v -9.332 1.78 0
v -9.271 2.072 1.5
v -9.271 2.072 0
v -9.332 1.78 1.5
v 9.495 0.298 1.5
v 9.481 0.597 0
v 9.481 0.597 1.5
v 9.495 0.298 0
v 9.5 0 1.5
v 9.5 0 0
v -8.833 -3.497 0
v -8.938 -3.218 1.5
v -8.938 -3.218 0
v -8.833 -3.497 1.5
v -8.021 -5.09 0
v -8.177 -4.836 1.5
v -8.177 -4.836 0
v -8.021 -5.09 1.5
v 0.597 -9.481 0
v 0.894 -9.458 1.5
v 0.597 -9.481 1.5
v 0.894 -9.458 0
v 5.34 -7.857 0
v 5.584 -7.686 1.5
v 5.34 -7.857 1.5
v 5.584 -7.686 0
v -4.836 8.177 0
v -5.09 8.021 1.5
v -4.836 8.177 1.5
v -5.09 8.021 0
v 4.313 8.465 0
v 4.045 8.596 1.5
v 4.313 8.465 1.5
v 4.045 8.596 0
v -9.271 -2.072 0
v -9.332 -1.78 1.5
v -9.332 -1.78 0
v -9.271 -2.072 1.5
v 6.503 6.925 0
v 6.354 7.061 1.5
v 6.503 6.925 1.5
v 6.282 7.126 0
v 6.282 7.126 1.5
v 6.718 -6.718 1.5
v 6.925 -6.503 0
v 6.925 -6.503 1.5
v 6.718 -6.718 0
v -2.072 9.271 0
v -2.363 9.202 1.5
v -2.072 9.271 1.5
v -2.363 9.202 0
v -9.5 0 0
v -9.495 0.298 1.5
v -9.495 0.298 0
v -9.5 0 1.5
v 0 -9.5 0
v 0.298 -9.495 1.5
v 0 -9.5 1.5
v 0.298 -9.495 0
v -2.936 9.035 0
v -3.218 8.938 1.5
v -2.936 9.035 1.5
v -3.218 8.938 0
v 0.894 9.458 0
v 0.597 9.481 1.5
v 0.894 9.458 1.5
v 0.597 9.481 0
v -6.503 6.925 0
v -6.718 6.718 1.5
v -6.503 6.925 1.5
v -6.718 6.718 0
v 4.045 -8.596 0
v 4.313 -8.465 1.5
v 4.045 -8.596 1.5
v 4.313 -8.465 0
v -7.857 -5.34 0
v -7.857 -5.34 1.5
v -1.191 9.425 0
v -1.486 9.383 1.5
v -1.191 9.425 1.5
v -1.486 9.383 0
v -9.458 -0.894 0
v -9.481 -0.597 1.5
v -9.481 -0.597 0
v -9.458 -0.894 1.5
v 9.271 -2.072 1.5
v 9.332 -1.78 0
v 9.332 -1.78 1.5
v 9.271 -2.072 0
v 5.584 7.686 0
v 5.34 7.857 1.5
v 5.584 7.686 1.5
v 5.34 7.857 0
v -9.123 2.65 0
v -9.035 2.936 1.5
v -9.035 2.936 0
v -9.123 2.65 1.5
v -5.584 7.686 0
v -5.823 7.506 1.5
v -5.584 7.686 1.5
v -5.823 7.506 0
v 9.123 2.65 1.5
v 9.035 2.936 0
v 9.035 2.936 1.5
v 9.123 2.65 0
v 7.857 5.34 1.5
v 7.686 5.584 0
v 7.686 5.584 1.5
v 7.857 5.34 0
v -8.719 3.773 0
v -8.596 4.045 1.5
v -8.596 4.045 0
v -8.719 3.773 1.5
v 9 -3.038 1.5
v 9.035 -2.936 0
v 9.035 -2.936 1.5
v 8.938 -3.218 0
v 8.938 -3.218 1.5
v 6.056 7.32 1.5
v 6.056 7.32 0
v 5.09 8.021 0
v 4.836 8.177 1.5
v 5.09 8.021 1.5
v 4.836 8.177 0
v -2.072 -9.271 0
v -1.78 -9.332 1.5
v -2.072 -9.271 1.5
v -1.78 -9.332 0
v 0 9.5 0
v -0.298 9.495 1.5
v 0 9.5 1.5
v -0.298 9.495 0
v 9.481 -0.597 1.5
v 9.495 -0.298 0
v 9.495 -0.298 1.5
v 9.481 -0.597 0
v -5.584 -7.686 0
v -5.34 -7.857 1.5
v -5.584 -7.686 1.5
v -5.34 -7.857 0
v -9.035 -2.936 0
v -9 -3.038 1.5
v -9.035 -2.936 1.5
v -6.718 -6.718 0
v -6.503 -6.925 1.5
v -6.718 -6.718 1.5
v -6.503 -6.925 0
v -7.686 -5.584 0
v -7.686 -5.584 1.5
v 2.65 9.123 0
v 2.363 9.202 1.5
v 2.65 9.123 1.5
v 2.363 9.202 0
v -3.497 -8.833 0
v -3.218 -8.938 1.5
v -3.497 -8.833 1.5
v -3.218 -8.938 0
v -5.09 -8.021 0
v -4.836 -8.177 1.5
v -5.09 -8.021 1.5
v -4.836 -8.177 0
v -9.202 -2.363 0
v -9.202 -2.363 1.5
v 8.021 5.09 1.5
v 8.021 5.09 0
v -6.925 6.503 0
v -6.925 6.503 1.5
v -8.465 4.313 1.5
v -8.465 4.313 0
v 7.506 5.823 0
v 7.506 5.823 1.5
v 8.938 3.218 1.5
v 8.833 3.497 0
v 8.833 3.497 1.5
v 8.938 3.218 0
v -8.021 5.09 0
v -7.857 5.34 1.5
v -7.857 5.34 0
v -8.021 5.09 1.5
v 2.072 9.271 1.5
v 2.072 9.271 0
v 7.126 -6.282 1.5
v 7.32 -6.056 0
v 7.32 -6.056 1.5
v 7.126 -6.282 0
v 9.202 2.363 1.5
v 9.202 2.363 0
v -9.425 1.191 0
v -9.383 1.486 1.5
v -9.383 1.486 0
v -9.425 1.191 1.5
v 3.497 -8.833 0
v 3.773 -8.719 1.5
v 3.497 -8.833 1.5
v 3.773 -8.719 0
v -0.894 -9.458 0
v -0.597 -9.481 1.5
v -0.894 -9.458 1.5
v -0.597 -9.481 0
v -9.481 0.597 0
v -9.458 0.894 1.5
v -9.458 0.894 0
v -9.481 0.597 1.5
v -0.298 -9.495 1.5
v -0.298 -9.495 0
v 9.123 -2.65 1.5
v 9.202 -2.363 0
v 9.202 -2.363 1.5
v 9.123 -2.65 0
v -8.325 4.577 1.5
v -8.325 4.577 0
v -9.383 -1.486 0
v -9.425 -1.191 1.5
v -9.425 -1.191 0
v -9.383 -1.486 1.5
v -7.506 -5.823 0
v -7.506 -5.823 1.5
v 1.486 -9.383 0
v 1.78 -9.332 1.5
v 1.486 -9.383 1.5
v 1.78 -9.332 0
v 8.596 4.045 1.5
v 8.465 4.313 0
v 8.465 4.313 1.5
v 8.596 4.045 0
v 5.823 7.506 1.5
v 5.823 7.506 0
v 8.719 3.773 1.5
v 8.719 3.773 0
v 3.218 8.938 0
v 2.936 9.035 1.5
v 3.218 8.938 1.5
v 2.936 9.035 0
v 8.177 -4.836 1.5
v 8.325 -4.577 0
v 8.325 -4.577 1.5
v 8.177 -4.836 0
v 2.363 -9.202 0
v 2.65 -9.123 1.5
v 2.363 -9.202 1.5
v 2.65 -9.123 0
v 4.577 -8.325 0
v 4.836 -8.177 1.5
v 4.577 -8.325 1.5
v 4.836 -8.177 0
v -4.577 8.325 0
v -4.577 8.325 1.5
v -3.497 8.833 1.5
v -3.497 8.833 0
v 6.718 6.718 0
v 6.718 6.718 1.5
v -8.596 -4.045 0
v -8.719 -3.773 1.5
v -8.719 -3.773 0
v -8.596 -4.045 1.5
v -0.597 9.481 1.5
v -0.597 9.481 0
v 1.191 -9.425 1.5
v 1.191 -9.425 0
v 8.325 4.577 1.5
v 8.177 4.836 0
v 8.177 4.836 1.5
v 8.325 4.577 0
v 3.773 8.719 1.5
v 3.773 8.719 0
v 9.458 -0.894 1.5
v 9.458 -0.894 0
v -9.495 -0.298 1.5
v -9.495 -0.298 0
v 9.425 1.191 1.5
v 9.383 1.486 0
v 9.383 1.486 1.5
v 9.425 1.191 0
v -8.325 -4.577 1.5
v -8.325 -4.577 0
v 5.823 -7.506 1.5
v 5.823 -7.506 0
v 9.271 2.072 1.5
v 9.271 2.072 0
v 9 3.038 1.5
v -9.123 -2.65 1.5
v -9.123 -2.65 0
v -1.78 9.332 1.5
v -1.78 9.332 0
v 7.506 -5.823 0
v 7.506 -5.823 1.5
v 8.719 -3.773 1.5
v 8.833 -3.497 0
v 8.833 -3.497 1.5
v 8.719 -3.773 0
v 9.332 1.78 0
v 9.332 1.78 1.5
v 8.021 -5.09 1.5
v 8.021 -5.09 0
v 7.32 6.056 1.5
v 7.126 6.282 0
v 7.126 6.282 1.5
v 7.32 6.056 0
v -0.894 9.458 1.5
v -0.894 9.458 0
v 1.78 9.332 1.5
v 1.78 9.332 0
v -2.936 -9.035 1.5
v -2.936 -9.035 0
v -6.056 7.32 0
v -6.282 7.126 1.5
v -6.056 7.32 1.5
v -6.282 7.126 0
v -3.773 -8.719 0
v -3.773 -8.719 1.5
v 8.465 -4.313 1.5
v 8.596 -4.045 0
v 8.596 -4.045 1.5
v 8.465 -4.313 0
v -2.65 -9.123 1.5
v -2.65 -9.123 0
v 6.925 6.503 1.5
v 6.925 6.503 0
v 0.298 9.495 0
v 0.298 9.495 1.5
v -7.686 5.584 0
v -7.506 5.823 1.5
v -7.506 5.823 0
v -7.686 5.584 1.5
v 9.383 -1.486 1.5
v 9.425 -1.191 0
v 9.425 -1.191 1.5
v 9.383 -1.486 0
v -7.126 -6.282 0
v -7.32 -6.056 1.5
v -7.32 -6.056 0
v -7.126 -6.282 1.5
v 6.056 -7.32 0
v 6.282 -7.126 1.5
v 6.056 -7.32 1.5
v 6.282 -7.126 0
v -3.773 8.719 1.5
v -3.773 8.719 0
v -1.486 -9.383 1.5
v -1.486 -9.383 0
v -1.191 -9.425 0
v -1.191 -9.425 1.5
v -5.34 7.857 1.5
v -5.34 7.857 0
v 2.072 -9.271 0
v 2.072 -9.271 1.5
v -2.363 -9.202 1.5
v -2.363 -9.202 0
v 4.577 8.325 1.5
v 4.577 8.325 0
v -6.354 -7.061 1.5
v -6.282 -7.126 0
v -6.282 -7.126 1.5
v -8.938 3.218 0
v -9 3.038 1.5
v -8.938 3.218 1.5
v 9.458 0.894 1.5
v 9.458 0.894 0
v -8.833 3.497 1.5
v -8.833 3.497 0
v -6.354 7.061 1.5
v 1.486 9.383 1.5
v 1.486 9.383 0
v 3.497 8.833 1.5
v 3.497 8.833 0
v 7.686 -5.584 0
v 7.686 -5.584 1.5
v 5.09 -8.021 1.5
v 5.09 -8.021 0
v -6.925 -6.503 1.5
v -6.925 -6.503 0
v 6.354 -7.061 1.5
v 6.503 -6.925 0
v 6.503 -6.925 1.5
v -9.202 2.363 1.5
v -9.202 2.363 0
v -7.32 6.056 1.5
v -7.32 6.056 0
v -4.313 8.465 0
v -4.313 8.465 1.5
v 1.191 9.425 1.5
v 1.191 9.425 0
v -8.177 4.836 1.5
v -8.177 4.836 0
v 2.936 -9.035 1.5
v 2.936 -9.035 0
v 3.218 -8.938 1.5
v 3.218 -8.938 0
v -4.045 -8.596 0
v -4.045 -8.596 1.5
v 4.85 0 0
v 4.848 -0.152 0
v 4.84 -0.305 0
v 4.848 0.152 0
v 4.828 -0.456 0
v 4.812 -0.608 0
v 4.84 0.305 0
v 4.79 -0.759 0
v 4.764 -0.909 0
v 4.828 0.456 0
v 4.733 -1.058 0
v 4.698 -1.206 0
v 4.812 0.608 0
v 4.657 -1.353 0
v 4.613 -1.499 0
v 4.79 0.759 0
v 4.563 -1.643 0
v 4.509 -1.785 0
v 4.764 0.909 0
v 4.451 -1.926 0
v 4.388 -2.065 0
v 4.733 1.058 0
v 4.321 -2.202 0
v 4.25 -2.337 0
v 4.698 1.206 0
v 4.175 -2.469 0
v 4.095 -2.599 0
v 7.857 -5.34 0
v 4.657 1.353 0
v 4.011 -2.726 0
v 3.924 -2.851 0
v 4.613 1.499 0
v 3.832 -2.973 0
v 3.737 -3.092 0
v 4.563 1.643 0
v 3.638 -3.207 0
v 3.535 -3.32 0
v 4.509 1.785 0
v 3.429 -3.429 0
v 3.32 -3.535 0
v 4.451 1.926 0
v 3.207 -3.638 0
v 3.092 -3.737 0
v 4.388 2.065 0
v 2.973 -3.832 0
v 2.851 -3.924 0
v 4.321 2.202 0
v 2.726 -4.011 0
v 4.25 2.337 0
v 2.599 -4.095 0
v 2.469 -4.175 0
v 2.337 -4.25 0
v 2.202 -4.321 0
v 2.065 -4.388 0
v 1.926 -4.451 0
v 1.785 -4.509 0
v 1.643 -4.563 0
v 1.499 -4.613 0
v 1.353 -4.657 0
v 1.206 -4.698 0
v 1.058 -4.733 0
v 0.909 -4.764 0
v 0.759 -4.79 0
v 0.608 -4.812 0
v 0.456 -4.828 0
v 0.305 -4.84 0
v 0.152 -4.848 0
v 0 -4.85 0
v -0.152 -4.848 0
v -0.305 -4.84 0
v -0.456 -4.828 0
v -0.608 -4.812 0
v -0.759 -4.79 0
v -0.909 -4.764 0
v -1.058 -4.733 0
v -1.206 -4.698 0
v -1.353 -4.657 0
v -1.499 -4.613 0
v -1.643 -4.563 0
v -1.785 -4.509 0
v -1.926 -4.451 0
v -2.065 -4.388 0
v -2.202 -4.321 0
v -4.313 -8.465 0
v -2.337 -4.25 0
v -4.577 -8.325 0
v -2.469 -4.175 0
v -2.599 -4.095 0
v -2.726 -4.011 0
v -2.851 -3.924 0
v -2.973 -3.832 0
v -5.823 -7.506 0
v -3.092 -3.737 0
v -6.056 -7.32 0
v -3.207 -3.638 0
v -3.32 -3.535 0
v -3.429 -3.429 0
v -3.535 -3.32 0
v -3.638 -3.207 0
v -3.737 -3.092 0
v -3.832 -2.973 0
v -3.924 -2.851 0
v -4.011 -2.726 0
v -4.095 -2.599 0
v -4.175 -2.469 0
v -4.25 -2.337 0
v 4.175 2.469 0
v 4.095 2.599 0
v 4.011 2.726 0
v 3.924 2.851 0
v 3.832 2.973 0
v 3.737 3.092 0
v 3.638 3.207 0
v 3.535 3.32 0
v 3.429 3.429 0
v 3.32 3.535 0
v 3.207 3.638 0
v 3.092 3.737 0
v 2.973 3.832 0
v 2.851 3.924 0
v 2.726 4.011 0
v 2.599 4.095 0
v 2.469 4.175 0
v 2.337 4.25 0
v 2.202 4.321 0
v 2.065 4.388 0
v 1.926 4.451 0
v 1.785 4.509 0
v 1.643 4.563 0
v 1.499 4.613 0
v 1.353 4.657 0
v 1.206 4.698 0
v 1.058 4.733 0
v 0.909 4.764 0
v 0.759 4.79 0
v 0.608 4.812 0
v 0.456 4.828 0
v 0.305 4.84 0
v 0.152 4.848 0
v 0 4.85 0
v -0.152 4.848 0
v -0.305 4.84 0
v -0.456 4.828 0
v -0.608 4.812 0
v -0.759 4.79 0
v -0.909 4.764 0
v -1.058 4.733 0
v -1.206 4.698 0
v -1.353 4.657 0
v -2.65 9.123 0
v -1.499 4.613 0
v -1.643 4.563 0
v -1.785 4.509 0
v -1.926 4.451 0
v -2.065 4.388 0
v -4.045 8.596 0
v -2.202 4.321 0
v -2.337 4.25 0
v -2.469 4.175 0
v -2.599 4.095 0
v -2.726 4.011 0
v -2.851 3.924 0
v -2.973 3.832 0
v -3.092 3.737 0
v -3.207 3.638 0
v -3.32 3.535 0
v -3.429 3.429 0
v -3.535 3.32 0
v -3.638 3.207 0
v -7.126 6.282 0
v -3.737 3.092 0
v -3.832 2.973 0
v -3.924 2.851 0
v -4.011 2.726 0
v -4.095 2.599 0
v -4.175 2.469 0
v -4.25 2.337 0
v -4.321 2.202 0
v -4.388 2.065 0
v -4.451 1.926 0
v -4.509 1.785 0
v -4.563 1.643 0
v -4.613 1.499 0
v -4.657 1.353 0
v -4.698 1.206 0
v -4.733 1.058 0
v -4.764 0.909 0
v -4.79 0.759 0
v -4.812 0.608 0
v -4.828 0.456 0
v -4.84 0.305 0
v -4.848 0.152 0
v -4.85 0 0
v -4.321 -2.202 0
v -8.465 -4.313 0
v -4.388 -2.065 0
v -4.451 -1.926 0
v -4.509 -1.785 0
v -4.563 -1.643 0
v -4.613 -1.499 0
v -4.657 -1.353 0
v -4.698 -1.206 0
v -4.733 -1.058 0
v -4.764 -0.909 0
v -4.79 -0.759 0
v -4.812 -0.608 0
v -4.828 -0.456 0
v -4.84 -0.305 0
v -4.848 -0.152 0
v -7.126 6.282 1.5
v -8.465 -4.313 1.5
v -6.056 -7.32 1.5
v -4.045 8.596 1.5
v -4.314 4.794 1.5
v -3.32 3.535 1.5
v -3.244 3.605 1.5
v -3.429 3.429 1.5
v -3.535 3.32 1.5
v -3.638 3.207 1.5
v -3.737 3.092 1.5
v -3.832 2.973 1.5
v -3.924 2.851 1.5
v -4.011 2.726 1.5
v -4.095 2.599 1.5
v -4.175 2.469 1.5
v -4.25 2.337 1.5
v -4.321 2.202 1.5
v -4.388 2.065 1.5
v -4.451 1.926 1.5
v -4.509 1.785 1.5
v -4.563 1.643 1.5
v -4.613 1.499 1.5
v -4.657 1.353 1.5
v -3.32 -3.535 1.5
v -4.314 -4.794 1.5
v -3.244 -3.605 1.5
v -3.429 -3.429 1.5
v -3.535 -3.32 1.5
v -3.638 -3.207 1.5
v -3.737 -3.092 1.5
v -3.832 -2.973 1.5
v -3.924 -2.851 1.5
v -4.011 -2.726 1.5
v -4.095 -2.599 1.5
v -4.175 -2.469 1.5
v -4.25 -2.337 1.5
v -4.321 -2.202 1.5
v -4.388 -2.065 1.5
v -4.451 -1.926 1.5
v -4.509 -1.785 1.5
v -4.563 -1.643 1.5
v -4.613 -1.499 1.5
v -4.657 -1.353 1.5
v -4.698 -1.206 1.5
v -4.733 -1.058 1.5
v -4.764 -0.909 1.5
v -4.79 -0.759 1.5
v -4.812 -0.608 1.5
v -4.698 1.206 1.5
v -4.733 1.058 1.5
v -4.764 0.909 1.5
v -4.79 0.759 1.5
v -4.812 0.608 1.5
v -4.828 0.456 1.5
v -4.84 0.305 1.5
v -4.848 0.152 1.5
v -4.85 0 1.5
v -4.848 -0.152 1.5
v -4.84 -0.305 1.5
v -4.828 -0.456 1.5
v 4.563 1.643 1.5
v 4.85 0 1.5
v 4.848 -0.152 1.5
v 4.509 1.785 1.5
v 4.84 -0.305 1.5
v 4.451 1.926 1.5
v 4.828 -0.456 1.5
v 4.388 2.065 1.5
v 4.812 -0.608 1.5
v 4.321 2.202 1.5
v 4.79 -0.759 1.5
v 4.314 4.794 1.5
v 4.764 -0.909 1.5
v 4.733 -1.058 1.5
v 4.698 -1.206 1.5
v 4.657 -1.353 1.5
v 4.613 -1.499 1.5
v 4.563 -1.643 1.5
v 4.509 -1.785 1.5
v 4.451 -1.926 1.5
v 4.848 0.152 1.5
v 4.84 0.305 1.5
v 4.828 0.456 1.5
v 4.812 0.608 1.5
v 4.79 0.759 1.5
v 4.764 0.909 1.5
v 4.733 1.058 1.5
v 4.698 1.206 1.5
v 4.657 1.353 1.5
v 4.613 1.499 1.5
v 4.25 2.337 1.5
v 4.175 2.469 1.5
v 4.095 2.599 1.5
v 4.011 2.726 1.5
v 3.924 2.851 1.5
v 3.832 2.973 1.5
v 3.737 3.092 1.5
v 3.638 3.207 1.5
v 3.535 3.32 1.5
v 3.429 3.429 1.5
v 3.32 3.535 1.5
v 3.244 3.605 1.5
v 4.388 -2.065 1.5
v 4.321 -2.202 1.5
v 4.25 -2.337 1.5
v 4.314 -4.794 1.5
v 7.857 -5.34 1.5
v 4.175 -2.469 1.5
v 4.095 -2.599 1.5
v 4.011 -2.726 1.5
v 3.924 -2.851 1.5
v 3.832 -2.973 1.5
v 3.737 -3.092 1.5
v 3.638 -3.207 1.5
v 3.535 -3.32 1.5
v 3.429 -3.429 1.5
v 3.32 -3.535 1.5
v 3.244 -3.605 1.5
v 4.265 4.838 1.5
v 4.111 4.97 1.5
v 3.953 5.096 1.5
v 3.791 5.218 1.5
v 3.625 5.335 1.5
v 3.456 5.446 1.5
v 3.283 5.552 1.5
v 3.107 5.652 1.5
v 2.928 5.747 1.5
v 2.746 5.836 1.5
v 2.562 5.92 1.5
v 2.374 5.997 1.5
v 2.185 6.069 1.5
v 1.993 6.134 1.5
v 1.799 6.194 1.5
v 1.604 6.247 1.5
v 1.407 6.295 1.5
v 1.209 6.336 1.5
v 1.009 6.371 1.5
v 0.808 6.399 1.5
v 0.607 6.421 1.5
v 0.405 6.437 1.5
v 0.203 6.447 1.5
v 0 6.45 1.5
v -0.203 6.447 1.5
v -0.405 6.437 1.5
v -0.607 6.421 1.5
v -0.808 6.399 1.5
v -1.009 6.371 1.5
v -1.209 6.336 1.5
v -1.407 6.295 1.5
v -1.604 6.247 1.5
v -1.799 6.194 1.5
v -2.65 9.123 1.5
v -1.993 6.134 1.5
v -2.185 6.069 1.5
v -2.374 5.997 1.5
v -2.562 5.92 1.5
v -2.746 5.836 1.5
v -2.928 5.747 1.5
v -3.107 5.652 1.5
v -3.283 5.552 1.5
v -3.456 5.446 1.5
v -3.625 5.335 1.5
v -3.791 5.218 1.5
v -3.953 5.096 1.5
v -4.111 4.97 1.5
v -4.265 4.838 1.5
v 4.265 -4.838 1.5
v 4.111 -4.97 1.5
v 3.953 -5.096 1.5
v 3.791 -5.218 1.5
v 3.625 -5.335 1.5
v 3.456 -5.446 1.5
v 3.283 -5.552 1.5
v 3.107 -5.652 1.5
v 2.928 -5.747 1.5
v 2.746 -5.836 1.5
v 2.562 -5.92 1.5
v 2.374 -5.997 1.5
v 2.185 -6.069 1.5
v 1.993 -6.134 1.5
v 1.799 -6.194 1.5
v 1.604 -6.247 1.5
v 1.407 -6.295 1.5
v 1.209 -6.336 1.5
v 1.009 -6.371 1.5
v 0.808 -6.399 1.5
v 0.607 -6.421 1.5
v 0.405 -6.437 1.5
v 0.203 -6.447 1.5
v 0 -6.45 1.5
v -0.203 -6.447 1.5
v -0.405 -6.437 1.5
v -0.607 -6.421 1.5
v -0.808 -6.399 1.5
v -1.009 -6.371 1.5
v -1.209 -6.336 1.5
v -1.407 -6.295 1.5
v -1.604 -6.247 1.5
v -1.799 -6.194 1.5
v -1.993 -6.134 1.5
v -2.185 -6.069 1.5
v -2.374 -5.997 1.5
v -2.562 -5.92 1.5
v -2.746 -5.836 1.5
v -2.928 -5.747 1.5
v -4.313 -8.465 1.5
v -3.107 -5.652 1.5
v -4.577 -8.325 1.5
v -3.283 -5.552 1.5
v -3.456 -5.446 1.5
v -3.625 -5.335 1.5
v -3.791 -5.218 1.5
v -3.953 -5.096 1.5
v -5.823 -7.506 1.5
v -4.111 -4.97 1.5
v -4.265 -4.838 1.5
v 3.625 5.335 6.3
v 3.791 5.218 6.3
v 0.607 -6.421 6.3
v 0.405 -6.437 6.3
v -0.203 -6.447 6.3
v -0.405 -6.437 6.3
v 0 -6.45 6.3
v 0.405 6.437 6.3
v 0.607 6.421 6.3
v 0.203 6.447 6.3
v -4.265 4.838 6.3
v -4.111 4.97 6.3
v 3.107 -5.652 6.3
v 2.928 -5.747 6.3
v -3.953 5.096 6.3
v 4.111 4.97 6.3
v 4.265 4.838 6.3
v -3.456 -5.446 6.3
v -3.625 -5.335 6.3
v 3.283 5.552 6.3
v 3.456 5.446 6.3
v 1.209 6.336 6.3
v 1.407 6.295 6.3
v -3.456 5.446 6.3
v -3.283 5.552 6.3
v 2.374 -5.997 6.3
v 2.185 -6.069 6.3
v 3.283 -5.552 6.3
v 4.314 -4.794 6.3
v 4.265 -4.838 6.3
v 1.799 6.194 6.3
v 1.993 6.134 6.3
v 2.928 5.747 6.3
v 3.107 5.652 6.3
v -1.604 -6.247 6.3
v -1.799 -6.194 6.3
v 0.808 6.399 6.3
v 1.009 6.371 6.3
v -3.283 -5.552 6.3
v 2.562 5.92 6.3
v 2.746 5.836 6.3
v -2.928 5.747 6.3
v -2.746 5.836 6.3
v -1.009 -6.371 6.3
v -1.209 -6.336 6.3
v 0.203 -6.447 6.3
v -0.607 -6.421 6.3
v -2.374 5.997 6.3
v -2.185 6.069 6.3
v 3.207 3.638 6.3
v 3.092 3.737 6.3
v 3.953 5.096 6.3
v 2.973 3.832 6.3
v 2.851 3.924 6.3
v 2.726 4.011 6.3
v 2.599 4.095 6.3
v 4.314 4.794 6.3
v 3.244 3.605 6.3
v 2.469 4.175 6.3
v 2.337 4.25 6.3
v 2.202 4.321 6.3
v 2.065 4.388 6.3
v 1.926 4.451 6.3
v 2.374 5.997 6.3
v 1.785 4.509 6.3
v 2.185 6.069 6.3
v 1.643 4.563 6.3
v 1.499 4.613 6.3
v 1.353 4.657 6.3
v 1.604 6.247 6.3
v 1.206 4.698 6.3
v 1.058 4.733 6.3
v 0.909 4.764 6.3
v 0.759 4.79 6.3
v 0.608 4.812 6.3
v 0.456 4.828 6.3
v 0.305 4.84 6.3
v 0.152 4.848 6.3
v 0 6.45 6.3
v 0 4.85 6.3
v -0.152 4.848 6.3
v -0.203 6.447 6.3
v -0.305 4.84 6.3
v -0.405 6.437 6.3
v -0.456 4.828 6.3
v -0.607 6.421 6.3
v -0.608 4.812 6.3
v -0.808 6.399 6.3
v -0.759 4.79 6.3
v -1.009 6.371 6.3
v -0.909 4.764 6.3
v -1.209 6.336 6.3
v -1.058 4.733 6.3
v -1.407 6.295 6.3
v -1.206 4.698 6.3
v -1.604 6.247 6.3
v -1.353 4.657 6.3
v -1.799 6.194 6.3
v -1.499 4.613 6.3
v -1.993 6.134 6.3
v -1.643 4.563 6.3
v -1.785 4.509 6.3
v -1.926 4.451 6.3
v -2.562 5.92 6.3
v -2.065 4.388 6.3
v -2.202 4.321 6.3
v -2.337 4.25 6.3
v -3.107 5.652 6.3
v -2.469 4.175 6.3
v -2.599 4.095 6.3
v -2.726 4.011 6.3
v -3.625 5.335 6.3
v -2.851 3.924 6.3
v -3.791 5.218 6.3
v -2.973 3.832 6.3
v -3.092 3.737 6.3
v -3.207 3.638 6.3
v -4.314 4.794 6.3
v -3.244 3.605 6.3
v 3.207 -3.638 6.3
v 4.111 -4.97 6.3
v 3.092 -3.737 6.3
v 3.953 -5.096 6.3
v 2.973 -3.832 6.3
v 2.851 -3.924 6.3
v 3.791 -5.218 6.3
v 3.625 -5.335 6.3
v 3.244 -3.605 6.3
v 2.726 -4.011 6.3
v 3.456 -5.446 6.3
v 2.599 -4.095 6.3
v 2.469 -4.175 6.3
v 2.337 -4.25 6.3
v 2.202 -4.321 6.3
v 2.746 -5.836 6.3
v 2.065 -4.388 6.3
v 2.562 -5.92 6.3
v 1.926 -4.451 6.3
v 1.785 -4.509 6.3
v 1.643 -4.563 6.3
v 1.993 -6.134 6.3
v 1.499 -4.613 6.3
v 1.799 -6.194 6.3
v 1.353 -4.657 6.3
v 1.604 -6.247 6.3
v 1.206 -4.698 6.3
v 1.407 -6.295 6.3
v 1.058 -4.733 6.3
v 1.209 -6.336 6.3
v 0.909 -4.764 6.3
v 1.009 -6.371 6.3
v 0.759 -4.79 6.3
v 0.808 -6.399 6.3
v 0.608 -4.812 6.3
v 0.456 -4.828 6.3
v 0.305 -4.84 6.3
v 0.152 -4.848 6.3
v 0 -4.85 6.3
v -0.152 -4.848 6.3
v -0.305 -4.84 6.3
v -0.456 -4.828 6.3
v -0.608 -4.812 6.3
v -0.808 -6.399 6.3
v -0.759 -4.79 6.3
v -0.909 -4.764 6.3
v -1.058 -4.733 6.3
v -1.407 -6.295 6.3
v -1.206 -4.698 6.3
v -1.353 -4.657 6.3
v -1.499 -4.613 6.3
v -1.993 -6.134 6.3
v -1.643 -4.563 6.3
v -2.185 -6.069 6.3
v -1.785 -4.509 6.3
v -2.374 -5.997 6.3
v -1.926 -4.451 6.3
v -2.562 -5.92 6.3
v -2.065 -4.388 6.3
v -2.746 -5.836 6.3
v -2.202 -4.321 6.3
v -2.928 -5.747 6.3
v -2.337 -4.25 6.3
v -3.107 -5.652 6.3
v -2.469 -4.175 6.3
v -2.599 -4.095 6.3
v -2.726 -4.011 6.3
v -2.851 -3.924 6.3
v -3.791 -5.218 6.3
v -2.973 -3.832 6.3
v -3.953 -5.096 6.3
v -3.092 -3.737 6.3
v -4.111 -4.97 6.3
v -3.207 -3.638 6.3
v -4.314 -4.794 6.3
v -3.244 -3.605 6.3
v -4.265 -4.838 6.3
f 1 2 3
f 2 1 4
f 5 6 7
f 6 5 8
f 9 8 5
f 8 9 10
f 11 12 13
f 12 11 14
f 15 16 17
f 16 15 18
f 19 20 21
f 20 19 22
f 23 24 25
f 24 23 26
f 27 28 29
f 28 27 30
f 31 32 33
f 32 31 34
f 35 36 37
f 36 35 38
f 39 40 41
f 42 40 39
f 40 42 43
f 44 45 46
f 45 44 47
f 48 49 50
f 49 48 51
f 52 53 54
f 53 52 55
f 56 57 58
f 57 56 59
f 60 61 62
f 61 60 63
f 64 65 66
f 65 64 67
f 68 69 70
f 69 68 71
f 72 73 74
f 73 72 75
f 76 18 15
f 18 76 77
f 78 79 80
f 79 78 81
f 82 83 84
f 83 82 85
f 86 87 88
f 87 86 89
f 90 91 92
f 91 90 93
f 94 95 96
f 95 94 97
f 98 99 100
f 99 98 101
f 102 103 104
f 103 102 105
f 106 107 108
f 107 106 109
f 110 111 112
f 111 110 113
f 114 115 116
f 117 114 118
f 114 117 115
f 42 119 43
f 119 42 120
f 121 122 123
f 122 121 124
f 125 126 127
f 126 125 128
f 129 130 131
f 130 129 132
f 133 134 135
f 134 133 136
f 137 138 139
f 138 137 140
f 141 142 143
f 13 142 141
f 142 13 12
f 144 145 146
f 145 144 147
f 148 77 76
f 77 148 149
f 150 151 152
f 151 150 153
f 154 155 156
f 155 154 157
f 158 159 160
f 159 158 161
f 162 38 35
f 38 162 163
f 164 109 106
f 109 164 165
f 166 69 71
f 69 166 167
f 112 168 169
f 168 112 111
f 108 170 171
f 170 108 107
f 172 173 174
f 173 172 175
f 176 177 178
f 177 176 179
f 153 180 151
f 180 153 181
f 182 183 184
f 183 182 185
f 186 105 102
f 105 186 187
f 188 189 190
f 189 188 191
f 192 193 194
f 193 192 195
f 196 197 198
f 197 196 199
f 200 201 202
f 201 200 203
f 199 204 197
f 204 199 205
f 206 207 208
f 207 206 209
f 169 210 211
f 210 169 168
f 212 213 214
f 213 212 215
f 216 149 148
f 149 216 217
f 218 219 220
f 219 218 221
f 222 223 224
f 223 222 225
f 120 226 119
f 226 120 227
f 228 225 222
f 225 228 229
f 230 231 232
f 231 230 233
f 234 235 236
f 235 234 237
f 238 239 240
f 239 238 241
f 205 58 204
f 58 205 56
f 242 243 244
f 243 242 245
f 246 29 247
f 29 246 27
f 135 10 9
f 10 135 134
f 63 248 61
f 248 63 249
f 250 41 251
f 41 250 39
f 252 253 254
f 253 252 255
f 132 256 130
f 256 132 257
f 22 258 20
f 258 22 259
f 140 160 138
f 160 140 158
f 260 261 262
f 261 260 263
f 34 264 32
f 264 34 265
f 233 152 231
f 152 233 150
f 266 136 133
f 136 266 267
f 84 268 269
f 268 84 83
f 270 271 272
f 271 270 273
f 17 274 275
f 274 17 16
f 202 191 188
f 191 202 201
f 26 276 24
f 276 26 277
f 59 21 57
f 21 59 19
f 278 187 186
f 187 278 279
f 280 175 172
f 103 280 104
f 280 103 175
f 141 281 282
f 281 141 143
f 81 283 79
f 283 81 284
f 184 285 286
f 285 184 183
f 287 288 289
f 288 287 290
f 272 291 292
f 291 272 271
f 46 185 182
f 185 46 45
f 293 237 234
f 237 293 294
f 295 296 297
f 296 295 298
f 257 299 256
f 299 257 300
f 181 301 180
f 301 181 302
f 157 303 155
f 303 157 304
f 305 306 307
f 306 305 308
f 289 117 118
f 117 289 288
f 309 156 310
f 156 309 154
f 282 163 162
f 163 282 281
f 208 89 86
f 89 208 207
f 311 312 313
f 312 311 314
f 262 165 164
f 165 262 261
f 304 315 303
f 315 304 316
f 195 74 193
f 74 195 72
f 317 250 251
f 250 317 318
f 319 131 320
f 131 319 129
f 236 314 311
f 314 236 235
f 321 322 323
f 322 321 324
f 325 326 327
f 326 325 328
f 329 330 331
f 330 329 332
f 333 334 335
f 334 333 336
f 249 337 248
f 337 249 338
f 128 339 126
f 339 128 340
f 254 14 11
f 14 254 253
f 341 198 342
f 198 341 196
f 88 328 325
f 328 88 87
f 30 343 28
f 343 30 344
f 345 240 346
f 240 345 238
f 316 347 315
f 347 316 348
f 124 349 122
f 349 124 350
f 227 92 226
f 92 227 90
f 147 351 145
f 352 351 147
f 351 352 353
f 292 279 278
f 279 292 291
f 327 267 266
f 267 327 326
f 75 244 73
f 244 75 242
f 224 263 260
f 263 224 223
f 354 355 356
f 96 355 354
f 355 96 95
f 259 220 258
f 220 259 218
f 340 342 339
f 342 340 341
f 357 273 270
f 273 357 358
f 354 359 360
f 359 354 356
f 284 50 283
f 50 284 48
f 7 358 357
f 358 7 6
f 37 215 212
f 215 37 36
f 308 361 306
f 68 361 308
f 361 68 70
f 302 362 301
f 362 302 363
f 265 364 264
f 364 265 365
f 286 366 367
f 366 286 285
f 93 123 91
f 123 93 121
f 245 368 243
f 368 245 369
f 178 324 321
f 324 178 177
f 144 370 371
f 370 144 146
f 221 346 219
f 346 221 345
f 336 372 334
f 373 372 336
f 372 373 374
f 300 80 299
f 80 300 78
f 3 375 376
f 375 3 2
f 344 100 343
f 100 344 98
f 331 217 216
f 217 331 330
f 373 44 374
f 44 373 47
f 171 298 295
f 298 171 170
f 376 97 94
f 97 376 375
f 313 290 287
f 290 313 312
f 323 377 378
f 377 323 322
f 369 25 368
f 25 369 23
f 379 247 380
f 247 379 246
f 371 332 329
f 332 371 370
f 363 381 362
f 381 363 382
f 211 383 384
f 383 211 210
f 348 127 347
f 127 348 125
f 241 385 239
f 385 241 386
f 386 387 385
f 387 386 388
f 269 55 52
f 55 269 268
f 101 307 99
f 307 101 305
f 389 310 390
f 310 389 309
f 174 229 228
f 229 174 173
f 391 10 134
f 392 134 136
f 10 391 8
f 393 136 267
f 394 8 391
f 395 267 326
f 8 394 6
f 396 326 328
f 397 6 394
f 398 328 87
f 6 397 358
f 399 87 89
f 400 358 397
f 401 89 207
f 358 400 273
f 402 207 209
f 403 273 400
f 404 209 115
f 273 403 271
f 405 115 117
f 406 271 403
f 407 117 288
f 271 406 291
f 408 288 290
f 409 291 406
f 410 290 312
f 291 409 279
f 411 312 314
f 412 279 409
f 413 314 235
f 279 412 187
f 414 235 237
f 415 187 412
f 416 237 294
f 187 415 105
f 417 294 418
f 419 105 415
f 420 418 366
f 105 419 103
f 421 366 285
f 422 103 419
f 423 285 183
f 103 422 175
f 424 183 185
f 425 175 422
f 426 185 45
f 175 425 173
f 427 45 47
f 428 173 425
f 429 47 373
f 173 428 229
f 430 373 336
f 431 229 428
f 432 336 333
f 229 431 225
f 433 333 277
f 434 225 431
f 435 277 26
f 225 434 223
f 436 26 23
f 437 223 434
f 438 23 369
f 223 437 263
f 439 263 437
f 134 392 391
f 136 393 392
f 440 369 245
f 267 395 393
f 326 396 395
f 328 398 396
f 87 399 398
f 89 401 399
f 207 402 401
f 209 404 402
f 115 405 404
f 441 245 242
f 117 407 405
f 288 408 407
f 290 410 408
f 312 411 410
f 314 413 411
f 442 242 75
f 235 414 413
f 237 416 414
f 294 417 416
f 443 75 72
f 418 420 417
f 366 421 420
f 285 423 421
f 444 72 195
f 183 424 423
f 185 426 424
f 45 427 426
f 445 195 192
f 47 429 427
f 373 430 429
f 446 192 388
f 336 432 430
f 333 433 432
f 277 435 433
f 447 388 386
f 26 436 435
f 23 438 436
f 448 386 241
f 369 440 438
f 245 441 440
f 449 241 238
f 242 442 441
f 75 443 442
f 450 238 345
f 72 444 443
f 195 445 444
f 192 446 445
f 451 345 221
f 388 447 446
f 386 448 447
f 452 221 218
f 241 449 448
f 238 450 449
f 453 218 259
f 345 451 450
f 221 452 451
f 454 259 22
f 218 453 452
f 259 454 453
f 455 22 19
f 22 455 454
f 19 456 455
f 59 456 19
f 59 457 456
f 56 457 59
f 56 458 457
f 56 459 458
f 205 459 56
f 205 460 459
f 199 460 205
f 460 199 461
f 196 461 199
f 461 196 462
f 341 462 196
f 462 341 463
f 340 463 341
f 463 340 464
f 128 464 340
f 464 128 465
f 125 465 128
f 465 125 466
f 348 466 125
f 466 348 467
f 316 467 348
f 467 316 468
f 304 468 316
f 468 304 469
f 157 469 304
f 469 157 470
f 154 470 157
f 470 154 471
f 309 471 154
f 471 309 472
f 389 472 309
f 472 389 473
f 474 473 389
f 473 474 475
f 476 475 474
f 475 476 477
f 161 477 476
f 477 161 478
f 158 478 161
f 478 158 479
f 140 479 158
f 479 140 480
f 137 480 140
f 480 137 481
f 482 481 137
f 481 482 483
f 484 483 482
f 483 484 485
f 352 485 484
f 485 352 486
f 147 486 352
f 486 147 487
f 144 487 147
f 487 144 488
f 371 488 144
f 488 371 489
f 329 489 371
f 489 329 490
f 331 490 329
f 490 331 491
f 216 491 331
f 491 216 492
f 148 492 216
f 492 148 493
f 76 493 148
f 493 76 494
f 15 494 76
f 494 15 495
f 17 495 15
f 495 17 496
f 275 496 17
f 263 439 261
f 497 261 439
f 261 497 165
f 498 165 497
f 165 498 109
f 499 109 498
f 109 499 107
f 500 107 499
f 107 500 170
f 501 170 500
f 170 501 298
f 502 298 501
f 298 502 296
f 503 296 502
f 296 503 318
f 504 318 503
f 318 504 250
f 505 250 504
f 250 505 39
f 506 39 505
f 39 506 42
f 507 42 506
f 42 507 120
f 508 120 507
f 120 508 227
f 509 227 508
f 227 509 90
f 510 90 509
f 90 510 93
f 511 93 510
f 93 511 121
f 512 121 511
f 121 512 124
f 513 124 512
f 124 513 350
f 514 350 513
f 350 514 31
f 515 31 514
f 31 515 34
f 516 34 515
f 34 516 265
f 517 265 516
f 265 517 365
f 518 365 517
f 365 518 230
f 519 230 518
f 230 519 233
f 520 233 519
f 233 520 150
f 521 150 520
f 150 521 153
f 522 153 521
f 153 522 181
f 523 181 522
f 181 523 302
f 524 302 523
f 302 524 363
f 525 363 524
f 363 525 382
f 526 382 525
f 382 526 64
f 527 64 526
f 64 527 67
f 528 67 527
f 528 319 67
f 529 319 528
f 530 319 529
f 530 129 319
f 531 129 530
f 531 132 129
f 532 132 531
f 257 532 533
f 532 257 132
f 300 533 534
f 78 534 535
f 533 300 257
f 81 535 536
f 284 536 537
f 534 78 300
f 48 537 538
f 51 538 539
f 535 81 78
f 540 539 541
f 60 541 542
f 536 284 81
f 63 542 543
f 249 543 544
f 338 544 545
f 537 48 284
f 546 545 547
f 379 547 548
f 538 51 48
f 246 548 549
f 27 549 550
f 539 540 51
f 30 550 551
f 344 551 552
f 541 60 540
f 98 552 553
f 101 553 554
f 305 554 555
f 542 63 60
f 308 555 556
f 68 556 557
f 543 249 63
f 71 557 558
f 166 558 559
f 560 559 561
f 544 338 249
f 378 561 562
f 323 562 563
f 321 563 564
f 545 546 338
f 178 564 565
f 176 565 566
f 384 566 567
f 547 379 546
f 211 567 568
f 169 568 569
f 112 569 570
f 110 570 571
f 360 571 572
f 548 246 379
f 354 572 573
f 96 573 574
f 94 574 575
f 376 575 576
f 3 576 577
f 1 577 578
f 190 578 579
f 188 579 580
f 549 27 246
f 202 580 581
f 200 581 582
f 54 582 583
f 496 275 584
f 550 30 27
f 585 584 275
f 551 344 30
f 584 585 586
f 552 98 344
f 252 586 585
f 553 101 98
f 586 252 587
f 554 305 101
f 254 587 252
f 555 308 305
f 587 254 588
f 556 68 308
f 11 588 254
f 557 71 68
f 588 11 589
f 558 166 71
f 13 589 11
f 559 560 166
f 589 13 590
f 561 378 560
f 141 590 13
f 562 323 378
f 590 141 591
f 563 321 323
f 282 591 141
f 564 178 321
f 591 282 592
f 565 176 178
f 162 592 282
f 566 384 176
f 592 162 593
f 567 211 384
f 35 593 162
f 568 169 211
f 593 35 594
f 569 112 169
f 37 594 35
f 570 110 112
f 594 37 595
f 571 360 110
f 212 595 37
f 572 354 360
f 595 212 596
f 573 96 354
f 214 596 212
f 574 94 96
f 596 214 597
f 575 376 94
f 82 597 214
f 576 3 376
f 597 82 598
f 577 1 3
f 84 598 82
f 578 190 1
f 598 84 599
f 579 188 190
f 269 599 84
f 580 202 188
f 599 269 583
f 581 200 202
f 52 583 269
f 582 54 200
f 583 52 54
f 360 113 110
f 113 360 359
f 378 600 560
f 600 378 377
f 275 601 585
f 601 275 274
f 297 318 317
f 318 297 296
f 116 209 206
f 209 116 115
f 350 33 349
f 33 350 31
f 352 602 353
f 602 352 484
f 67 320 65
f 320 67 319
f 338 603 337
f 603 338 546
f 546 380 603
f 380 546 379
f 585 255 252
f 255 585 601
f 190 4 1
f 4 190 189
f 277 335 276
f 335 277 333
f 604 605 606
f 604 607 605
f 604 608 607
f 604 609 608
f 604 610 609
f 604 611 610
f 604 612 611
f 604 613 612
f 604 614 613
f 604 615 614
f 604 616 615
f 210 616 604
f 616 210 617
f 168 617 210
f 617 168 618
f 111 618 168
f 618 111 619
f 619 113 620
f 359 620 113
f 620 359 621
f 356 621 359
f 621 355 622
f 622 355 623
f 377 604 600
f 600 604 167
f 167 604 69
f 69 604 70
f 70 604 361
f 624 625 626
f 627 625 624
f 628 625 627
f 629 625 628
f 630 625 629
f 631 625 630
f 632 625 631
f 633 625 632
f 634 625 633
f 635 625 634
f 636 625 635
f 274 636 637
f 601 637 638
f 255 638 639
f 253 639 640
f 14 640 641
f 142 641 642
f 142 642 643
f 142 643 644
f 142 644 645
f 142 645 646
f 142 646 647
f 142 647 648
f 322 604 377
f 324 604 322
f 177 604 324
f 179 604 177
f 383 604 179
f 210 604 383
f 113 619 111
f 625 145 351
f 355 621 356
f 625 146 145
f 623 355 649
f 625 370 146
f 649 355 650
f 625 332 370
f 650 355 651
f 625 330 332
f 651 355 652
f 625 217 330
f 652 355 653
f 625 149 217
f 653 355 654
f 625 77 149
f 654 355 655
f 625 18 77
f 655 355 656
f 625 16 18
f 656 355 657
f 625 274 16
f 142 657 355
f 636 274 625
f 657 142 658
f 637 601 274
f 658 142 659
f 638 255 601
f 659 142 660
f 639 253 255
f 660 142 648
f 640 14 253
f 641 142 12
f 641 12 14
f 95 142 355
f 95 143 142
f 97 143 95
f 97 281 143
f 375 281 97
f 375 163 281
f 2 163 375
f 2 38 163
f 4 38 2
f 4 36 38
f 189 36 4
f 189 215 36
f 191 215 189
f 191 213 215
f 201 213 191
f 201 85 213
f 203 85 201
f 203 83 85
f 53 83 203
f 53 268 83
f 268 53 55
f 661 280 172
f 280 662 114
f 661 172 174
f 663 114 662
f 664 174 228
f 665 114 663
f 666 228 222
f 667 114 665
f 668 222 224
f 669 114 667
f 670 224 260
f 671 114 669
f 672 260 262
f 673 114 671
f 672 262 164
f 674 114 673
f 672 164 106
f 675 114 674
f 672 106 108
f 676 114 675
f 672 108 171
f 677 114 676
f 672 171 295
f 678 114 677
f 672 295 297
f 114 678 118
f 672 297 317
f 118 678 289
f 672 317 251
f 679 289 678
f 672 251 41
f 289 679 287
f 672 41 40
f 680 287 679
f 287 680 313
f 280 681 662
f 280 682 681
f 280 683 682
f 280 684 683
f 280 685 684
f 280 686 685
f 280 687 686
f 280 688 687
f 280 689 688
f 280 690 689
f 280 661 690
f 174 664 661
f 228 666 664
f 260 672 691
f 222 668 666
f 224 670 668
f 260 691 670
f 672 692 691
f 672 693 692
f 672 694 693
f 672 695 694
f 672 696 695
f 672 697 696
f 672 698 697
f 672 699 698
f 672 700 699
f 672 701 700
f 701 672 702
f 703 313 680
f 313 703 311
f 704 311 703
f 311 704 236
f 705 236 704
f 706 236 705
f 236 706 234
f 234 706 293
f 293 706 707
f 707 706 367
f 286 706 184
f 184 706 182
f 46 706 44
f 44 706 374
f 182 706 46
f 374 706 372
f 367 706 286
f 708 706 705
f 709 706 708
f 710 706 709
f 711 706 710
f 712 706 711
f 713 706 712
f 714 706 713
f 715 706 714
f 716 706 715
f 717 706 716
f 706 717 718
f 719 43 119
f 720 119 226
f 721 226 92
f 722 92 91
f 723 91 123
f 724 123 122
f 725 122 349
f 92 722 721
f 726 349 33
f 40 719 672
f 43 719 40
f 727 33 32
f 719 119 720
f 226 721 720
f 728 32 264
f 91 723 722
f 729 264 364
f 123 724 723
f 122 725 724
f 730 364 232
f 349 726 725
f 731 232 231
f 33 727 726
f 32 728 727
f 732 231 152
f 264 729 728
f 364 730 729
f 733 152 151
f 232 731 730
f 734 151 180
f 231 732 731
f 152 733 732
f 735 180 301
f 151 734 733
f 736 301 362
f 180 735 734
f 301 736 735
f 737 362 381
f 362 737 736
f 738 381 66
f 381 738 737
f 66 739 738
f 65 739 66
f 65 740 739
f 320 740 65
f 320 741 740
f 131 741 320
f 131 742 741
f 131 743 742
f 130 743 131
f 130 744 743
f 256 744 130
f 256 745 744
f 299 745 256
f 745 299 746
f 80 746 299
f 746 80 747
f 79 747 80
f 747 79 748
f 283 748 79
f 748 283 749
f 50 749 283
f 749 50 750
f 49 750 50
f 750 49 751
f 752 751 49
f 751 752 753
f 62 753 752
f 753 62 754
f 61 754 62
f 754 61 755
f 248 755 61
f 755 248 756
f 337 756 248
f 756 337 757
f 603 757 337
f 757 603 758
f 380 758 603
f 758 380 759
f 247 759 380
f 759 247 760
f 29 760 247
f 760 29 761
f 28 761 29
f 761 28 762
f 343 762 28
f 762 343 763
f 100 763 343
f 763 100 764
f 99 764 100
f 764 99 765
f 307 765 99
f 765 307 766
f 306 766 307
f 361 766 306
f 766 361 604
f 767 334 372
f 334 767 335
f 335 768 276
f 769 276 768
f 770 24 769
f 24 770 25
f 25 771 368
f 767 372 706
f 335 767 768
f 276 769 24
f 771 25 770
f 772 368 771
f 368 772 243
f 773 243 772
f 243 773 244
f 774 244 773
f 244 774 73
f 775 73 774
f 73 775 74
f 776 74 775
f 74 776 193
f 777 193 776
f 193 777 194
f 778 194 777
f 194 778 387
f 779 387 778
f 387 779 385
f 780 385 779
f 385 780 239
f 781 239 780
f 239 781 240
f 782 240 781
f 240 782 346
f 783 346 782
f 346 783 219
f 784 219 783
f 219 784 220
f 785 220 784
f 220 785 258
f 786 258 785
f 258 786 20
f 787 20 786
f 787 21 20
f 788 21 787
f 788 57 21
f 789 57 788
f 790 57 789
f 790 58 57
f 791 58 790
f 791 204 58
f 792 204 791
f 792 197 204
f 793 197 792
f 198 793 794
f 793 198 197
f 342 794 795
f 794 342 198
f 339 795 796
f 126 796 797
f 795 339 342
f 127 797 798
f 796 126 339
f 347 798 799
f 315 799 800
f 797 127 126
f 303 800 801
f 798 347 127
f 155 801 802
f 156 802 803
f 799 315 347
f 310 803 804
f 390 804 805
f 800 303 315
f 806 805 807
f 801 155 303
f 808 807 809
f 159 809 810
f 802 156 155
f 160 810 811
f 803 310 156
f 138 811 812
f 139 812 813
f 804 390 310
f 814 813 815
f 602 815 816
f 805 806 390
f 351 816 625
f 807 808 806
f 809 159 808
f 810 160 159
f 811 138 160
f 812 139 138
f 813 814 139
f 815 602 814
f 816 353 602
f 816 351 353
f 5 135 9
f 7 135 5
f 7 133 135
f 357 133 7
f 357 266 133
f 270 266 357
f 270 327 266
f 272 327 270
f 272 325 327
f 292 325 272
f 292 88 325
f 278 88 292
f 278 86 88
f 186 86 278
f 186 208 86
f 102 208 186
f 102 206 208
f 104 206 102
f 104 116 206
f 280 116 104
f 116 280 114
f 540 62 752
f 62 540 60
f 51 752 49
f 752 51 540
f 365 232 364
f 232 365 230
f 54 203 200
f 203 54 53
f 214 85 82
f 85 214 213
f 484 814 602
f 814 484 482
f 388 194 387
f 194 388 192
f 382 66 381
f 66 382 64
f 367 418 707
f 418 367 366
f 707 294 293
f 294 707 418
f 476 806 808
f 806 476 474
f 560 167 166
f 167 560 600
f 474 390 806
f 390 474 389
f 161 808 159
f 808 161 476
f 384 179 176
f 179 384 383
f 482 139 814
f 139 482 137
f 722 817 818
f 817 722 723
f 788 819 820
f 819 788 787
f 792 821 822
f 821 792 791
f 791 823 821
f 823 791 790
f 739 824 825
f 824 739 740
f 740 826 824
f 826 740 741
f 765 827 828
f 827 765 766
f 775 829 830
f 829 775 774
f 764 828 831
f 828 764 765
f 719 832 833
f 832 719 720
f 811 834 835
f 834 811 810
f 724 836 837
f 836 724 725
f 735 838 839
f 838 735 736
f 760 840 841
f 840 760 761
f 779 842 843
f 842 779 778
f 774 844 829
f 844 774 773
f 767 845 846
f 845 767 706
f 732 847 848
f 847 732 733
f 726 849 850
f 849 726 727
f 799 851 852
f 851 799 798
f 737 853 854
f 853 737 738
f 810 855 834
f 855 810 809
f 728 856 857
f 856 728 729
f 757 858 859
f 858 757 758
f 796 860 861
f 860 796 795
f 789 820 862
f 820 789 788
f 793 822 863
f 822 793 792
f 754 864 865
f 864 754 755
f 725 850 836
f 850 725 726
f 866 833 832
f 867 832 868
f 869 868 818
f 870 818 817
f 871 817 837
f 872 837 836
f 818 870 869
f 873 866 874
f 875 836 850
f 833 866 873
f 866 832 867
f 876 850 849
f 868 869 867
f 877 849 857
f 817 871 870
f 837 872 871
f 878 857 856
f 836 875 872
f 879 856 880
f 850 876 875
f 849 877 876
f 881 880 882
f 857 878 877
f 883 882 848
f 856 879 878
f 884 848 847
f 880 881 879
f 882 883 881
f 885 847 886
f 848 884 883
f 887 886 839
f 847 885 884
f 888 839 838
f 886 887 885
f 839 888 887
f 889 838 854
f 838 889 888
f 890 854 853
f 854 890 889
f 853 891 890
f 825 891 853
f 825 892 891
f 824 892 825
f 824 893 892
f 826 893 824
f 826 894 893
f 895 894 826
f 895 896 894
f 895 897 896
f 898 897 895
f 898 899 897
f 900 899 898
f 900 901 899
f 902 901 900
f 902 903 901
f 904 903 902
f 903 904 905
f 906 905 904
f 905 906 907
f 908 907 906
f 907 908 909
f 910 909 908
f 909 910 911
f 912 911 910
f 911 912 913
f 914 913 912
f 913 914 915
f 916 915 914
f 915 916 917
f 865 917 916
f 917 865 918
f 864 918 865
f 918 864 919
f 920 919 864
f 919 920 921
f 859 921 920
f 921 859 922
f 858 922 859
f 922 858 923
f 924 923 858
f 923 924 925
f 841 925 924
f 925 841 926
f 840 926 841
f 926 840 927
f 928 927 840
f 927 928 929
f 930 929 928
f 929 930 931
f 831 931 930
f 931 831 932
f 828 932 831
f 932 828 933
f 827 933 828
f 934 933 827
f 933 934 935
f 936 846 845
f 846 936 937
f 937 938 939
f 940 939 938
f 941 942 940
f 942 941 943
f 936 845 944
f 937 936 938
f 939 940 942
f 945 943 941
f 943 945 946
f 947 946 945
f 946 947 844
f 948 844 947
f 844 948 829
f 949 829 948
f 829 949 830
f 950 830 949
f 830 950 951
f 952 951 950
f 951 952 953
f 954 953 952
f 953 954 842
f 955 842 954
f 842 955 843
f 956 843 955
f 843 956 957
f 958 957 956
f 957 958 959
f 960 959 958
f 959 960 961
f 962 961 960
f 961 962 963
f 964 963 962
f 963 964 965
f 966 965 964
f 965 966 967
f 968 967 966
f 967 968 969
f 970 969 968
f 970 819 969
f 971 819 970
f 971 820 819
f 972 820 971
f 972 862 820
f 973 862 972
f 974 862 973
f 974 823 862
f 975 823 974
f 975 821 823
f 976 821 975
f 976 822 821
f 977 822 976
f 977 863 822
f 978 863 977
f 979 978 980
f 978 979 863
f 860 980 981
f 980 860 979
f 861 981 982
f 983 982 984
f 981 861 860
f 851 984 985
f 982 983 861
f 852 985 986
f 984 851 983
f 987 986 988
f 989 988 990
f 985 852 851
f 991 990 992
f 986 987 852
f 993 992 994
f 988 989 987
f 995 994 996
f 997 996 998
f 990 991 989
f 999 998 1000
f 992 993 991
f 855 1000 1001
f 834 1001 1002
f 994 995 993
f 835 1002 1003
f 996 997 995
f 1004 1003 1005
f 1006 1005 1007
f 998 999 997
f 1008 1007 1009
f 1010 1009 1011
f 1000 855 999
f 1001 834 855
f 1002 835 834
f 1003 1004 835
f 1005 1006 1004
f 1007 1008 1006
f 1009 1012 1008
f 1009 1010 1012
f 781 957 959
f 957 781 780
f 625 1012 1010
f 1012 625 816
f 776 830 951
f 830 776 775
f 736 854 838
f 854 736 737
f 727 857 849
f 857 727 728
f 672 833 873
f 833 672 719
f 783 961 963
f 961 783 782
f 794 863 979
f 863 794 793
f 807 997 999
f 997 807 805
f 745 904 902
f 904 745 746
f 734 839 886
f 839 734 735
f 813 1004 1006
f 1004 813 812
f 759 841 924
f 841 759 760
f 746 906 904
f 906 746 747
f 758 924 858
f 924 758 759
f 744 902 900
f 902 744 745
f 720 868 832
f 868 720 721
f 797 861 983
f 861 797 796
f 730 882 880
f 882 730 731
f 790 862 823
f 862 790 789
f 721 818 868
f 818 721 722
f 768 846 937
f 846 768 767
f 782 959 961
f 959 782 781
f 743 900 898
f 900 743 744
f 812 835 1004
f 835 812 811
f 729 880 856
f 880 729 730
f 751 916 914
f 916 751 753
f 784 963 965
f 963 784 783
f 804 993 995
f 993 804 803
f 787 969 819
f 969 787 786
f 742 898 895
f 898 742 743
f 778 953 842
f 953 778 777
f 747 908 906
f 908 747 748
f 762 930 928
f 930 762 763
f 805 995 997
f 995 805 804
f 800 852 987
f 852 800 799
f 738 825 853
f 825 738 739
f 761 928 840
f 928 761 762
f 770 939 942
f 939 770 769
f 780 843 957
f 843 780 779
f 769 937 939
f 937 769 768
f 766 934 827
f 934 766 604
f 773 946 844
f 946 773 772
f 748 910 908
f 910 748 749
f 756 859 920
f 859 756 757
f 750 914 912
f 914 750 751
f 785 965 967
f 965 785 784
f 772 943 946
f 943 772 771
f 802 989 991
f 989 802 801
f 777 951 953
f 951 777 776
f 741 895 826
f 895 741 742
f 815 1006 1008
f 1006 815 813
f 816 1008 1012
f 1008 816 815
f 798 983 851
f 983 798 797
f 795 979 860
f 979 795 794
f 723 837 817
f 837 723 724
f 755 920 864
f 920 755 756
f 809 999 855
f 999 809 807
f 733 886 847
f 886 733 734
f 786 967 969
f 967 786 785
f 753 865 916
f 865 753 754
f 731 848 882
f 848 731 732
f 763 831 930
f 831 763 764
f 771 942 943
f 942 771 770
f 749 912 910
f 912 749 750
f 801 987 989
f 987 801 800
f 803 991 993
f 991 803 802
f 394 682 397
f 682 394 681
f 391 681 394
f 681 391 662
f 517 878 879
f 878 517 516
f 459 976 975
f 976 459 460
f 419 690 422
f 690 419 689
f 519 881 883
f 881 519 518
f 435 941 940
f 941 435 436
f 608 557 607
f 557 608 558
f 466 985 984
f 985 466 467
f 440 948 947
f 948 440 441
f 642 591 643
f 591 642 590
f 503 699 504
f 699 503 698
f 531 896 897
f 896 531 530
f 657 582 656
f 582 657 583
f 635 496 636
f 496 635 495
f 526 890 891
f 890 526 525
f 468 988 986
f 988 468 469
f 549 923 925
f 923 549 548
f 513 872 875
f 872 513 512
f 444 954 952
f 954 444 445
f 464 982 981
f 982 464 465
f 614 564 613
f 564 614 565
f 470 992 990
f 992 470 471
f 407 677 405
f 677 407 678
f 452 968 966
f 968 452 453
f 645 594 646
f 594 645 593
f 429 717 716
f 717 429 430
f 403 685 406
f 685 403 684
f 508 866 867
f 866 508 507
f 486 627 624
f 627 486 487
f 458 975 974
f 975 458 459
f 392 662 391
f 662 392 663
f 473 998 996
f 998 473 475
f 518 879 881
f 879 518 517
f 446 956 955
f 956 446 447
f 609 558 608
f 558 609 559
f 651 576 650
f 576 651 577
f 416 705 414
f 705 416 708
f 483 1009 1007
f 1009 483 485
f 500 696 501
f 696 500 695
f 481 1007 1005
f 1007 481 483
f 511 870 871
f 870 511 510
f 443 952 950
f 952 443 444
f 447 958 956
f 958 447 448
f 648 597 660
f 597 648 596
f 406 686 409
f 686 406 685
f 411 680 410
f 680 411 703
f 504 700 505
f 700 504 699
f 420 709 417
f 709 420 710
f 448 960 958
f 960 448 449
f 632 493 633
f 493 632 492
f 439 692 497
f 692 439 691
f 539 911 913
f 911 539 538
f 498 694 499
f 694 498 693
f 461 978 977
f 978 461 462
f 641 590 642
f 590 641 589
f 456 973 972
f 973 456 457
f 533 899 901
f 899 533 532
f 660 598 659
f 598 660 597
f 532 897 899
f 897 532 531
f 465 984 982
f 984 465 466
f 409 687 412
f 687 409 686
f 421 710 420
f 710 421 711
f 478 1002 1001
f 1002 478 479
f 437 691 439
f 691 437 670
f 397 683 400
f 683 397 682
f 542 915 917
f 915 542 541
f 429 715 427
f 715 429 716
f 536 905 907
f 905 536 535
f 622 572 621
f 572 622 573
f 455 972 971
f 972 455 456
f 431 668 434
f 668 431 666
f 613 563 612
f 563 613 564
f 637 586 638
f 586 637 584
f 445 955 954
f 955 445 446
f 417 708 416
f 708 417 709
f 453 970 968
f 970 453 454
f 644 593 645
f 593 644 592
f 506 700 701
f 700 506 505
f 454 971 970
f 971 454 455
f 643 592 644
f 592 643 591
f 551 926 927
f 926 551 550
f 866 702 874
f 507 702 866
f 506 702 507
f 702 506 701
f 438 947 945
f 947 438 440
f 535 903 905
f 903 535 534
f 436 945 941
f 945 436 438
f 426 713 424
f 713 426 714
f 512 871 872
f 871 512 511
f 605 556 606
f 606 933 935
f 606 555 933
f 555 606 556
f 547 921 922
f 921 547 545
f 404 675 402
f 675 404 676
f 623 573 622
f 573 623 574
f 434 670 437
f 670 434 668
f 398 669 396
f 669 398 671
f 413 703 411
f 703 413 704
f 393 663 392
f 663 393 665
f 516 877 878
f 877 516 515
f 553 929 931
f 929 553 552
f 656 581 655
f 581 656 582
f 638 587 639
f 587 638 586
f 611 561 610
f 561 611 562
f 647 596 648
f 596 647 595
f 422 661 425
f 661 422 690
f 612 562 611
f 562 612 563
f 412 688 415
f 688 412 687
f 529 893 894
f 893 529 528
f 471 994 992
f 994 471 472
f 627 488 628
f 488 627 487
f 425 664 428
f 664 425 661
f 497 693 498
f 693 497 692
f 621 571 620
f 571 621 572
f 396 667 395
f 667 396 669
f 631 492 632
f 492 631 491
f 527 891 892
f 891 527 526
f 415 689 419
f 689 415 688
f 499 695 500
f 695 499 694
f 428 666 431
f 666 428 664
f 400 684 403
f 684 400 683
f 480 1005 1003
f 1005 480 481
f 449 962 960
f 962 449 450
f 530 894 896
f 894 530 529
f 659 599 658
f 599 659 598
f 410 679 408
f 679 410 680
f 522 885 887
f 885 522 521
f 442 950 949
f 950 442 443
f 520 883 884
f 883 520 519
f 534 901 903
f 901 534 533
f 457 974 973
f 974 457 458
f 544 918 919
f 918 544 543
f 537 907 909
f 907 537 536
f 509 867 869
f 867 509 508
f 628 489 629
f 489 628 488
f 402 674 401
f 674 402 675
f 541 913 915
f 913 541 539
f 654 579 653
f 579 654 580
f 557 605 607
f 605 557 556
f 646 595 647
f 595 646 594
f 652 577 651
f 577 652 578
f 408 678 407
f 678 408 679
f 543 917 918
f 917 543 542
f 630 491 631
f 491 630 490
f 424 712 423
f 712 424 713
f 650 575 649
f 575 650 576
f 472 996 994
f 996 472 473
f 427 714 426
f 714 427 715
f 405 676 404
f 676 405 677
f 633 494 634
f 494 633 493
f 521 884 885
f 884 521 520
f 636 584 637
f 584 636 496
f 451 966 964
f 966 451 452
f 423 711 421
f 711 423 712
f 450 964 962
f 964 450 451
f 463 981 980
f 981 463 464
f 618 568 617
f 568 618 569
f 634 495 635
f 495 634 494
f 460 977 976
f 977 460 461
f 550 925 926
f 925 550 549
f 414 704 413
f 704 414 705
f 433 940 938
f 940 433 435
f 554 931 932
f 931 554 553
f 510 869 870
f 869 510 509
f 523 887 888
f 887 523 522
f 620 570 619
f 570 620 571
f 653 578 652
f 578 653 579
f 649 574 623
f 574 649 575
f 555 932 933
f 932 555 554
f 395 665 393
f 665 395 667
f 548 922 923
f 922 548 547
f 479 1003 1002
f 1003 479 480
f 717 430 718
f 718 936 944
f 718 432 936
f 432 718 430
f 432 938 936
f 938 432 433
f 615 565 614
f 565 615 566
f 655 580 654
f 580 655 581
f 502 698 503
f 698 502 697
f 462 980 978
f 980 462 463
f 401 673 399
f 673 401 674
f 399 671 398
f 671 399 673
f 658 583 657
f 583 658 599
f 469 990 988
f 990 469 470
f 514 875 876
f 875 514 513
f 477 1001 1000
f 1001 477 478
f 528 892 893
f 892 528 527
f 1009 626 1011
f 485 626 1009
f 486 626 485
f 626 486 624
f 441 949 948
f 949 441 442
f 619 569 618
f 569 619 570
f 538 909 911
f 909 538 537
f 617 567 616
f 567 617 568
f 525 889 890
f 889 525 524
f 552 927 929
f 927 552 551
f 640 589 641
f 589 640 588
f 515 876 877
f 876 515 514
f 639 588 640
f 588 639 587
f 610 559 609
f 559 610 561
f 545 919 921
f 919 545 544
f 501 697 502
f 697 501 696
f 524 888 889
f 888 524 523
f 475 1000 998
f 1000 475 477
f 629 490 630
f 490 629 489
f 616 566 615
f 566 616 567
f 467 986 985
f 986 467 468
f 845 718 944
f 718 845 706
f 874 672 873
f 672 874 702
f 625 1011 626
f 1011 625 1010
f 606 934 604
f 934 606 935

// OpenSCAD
res = 200;

difference(){
    union(){
        // Outer ring
        cylinder(h = 1.5, d = 19, $fn = res);
        // Pins
        cylinder(h = 6.3, d = 12.9, $fn = res);
    }
    // Center hole
    cylinder(h = 6.3, d = 9.7, $fn = res);
    // Side 1
    translate([0, 0, 1.5]){
        linear_extrude(height = 6.3 - 1.5){
            polygon(points = [[0, 0], [9, 10], [9, -10]]);
        }
    }
    // Side 2
    translate([0, 0, 1.5]){
        linear_extrude(height = 6.3 - 1.5){
            polygon(points = [[0, 0], [-9, 10], [-9, -10]]);
        }
    }
}
